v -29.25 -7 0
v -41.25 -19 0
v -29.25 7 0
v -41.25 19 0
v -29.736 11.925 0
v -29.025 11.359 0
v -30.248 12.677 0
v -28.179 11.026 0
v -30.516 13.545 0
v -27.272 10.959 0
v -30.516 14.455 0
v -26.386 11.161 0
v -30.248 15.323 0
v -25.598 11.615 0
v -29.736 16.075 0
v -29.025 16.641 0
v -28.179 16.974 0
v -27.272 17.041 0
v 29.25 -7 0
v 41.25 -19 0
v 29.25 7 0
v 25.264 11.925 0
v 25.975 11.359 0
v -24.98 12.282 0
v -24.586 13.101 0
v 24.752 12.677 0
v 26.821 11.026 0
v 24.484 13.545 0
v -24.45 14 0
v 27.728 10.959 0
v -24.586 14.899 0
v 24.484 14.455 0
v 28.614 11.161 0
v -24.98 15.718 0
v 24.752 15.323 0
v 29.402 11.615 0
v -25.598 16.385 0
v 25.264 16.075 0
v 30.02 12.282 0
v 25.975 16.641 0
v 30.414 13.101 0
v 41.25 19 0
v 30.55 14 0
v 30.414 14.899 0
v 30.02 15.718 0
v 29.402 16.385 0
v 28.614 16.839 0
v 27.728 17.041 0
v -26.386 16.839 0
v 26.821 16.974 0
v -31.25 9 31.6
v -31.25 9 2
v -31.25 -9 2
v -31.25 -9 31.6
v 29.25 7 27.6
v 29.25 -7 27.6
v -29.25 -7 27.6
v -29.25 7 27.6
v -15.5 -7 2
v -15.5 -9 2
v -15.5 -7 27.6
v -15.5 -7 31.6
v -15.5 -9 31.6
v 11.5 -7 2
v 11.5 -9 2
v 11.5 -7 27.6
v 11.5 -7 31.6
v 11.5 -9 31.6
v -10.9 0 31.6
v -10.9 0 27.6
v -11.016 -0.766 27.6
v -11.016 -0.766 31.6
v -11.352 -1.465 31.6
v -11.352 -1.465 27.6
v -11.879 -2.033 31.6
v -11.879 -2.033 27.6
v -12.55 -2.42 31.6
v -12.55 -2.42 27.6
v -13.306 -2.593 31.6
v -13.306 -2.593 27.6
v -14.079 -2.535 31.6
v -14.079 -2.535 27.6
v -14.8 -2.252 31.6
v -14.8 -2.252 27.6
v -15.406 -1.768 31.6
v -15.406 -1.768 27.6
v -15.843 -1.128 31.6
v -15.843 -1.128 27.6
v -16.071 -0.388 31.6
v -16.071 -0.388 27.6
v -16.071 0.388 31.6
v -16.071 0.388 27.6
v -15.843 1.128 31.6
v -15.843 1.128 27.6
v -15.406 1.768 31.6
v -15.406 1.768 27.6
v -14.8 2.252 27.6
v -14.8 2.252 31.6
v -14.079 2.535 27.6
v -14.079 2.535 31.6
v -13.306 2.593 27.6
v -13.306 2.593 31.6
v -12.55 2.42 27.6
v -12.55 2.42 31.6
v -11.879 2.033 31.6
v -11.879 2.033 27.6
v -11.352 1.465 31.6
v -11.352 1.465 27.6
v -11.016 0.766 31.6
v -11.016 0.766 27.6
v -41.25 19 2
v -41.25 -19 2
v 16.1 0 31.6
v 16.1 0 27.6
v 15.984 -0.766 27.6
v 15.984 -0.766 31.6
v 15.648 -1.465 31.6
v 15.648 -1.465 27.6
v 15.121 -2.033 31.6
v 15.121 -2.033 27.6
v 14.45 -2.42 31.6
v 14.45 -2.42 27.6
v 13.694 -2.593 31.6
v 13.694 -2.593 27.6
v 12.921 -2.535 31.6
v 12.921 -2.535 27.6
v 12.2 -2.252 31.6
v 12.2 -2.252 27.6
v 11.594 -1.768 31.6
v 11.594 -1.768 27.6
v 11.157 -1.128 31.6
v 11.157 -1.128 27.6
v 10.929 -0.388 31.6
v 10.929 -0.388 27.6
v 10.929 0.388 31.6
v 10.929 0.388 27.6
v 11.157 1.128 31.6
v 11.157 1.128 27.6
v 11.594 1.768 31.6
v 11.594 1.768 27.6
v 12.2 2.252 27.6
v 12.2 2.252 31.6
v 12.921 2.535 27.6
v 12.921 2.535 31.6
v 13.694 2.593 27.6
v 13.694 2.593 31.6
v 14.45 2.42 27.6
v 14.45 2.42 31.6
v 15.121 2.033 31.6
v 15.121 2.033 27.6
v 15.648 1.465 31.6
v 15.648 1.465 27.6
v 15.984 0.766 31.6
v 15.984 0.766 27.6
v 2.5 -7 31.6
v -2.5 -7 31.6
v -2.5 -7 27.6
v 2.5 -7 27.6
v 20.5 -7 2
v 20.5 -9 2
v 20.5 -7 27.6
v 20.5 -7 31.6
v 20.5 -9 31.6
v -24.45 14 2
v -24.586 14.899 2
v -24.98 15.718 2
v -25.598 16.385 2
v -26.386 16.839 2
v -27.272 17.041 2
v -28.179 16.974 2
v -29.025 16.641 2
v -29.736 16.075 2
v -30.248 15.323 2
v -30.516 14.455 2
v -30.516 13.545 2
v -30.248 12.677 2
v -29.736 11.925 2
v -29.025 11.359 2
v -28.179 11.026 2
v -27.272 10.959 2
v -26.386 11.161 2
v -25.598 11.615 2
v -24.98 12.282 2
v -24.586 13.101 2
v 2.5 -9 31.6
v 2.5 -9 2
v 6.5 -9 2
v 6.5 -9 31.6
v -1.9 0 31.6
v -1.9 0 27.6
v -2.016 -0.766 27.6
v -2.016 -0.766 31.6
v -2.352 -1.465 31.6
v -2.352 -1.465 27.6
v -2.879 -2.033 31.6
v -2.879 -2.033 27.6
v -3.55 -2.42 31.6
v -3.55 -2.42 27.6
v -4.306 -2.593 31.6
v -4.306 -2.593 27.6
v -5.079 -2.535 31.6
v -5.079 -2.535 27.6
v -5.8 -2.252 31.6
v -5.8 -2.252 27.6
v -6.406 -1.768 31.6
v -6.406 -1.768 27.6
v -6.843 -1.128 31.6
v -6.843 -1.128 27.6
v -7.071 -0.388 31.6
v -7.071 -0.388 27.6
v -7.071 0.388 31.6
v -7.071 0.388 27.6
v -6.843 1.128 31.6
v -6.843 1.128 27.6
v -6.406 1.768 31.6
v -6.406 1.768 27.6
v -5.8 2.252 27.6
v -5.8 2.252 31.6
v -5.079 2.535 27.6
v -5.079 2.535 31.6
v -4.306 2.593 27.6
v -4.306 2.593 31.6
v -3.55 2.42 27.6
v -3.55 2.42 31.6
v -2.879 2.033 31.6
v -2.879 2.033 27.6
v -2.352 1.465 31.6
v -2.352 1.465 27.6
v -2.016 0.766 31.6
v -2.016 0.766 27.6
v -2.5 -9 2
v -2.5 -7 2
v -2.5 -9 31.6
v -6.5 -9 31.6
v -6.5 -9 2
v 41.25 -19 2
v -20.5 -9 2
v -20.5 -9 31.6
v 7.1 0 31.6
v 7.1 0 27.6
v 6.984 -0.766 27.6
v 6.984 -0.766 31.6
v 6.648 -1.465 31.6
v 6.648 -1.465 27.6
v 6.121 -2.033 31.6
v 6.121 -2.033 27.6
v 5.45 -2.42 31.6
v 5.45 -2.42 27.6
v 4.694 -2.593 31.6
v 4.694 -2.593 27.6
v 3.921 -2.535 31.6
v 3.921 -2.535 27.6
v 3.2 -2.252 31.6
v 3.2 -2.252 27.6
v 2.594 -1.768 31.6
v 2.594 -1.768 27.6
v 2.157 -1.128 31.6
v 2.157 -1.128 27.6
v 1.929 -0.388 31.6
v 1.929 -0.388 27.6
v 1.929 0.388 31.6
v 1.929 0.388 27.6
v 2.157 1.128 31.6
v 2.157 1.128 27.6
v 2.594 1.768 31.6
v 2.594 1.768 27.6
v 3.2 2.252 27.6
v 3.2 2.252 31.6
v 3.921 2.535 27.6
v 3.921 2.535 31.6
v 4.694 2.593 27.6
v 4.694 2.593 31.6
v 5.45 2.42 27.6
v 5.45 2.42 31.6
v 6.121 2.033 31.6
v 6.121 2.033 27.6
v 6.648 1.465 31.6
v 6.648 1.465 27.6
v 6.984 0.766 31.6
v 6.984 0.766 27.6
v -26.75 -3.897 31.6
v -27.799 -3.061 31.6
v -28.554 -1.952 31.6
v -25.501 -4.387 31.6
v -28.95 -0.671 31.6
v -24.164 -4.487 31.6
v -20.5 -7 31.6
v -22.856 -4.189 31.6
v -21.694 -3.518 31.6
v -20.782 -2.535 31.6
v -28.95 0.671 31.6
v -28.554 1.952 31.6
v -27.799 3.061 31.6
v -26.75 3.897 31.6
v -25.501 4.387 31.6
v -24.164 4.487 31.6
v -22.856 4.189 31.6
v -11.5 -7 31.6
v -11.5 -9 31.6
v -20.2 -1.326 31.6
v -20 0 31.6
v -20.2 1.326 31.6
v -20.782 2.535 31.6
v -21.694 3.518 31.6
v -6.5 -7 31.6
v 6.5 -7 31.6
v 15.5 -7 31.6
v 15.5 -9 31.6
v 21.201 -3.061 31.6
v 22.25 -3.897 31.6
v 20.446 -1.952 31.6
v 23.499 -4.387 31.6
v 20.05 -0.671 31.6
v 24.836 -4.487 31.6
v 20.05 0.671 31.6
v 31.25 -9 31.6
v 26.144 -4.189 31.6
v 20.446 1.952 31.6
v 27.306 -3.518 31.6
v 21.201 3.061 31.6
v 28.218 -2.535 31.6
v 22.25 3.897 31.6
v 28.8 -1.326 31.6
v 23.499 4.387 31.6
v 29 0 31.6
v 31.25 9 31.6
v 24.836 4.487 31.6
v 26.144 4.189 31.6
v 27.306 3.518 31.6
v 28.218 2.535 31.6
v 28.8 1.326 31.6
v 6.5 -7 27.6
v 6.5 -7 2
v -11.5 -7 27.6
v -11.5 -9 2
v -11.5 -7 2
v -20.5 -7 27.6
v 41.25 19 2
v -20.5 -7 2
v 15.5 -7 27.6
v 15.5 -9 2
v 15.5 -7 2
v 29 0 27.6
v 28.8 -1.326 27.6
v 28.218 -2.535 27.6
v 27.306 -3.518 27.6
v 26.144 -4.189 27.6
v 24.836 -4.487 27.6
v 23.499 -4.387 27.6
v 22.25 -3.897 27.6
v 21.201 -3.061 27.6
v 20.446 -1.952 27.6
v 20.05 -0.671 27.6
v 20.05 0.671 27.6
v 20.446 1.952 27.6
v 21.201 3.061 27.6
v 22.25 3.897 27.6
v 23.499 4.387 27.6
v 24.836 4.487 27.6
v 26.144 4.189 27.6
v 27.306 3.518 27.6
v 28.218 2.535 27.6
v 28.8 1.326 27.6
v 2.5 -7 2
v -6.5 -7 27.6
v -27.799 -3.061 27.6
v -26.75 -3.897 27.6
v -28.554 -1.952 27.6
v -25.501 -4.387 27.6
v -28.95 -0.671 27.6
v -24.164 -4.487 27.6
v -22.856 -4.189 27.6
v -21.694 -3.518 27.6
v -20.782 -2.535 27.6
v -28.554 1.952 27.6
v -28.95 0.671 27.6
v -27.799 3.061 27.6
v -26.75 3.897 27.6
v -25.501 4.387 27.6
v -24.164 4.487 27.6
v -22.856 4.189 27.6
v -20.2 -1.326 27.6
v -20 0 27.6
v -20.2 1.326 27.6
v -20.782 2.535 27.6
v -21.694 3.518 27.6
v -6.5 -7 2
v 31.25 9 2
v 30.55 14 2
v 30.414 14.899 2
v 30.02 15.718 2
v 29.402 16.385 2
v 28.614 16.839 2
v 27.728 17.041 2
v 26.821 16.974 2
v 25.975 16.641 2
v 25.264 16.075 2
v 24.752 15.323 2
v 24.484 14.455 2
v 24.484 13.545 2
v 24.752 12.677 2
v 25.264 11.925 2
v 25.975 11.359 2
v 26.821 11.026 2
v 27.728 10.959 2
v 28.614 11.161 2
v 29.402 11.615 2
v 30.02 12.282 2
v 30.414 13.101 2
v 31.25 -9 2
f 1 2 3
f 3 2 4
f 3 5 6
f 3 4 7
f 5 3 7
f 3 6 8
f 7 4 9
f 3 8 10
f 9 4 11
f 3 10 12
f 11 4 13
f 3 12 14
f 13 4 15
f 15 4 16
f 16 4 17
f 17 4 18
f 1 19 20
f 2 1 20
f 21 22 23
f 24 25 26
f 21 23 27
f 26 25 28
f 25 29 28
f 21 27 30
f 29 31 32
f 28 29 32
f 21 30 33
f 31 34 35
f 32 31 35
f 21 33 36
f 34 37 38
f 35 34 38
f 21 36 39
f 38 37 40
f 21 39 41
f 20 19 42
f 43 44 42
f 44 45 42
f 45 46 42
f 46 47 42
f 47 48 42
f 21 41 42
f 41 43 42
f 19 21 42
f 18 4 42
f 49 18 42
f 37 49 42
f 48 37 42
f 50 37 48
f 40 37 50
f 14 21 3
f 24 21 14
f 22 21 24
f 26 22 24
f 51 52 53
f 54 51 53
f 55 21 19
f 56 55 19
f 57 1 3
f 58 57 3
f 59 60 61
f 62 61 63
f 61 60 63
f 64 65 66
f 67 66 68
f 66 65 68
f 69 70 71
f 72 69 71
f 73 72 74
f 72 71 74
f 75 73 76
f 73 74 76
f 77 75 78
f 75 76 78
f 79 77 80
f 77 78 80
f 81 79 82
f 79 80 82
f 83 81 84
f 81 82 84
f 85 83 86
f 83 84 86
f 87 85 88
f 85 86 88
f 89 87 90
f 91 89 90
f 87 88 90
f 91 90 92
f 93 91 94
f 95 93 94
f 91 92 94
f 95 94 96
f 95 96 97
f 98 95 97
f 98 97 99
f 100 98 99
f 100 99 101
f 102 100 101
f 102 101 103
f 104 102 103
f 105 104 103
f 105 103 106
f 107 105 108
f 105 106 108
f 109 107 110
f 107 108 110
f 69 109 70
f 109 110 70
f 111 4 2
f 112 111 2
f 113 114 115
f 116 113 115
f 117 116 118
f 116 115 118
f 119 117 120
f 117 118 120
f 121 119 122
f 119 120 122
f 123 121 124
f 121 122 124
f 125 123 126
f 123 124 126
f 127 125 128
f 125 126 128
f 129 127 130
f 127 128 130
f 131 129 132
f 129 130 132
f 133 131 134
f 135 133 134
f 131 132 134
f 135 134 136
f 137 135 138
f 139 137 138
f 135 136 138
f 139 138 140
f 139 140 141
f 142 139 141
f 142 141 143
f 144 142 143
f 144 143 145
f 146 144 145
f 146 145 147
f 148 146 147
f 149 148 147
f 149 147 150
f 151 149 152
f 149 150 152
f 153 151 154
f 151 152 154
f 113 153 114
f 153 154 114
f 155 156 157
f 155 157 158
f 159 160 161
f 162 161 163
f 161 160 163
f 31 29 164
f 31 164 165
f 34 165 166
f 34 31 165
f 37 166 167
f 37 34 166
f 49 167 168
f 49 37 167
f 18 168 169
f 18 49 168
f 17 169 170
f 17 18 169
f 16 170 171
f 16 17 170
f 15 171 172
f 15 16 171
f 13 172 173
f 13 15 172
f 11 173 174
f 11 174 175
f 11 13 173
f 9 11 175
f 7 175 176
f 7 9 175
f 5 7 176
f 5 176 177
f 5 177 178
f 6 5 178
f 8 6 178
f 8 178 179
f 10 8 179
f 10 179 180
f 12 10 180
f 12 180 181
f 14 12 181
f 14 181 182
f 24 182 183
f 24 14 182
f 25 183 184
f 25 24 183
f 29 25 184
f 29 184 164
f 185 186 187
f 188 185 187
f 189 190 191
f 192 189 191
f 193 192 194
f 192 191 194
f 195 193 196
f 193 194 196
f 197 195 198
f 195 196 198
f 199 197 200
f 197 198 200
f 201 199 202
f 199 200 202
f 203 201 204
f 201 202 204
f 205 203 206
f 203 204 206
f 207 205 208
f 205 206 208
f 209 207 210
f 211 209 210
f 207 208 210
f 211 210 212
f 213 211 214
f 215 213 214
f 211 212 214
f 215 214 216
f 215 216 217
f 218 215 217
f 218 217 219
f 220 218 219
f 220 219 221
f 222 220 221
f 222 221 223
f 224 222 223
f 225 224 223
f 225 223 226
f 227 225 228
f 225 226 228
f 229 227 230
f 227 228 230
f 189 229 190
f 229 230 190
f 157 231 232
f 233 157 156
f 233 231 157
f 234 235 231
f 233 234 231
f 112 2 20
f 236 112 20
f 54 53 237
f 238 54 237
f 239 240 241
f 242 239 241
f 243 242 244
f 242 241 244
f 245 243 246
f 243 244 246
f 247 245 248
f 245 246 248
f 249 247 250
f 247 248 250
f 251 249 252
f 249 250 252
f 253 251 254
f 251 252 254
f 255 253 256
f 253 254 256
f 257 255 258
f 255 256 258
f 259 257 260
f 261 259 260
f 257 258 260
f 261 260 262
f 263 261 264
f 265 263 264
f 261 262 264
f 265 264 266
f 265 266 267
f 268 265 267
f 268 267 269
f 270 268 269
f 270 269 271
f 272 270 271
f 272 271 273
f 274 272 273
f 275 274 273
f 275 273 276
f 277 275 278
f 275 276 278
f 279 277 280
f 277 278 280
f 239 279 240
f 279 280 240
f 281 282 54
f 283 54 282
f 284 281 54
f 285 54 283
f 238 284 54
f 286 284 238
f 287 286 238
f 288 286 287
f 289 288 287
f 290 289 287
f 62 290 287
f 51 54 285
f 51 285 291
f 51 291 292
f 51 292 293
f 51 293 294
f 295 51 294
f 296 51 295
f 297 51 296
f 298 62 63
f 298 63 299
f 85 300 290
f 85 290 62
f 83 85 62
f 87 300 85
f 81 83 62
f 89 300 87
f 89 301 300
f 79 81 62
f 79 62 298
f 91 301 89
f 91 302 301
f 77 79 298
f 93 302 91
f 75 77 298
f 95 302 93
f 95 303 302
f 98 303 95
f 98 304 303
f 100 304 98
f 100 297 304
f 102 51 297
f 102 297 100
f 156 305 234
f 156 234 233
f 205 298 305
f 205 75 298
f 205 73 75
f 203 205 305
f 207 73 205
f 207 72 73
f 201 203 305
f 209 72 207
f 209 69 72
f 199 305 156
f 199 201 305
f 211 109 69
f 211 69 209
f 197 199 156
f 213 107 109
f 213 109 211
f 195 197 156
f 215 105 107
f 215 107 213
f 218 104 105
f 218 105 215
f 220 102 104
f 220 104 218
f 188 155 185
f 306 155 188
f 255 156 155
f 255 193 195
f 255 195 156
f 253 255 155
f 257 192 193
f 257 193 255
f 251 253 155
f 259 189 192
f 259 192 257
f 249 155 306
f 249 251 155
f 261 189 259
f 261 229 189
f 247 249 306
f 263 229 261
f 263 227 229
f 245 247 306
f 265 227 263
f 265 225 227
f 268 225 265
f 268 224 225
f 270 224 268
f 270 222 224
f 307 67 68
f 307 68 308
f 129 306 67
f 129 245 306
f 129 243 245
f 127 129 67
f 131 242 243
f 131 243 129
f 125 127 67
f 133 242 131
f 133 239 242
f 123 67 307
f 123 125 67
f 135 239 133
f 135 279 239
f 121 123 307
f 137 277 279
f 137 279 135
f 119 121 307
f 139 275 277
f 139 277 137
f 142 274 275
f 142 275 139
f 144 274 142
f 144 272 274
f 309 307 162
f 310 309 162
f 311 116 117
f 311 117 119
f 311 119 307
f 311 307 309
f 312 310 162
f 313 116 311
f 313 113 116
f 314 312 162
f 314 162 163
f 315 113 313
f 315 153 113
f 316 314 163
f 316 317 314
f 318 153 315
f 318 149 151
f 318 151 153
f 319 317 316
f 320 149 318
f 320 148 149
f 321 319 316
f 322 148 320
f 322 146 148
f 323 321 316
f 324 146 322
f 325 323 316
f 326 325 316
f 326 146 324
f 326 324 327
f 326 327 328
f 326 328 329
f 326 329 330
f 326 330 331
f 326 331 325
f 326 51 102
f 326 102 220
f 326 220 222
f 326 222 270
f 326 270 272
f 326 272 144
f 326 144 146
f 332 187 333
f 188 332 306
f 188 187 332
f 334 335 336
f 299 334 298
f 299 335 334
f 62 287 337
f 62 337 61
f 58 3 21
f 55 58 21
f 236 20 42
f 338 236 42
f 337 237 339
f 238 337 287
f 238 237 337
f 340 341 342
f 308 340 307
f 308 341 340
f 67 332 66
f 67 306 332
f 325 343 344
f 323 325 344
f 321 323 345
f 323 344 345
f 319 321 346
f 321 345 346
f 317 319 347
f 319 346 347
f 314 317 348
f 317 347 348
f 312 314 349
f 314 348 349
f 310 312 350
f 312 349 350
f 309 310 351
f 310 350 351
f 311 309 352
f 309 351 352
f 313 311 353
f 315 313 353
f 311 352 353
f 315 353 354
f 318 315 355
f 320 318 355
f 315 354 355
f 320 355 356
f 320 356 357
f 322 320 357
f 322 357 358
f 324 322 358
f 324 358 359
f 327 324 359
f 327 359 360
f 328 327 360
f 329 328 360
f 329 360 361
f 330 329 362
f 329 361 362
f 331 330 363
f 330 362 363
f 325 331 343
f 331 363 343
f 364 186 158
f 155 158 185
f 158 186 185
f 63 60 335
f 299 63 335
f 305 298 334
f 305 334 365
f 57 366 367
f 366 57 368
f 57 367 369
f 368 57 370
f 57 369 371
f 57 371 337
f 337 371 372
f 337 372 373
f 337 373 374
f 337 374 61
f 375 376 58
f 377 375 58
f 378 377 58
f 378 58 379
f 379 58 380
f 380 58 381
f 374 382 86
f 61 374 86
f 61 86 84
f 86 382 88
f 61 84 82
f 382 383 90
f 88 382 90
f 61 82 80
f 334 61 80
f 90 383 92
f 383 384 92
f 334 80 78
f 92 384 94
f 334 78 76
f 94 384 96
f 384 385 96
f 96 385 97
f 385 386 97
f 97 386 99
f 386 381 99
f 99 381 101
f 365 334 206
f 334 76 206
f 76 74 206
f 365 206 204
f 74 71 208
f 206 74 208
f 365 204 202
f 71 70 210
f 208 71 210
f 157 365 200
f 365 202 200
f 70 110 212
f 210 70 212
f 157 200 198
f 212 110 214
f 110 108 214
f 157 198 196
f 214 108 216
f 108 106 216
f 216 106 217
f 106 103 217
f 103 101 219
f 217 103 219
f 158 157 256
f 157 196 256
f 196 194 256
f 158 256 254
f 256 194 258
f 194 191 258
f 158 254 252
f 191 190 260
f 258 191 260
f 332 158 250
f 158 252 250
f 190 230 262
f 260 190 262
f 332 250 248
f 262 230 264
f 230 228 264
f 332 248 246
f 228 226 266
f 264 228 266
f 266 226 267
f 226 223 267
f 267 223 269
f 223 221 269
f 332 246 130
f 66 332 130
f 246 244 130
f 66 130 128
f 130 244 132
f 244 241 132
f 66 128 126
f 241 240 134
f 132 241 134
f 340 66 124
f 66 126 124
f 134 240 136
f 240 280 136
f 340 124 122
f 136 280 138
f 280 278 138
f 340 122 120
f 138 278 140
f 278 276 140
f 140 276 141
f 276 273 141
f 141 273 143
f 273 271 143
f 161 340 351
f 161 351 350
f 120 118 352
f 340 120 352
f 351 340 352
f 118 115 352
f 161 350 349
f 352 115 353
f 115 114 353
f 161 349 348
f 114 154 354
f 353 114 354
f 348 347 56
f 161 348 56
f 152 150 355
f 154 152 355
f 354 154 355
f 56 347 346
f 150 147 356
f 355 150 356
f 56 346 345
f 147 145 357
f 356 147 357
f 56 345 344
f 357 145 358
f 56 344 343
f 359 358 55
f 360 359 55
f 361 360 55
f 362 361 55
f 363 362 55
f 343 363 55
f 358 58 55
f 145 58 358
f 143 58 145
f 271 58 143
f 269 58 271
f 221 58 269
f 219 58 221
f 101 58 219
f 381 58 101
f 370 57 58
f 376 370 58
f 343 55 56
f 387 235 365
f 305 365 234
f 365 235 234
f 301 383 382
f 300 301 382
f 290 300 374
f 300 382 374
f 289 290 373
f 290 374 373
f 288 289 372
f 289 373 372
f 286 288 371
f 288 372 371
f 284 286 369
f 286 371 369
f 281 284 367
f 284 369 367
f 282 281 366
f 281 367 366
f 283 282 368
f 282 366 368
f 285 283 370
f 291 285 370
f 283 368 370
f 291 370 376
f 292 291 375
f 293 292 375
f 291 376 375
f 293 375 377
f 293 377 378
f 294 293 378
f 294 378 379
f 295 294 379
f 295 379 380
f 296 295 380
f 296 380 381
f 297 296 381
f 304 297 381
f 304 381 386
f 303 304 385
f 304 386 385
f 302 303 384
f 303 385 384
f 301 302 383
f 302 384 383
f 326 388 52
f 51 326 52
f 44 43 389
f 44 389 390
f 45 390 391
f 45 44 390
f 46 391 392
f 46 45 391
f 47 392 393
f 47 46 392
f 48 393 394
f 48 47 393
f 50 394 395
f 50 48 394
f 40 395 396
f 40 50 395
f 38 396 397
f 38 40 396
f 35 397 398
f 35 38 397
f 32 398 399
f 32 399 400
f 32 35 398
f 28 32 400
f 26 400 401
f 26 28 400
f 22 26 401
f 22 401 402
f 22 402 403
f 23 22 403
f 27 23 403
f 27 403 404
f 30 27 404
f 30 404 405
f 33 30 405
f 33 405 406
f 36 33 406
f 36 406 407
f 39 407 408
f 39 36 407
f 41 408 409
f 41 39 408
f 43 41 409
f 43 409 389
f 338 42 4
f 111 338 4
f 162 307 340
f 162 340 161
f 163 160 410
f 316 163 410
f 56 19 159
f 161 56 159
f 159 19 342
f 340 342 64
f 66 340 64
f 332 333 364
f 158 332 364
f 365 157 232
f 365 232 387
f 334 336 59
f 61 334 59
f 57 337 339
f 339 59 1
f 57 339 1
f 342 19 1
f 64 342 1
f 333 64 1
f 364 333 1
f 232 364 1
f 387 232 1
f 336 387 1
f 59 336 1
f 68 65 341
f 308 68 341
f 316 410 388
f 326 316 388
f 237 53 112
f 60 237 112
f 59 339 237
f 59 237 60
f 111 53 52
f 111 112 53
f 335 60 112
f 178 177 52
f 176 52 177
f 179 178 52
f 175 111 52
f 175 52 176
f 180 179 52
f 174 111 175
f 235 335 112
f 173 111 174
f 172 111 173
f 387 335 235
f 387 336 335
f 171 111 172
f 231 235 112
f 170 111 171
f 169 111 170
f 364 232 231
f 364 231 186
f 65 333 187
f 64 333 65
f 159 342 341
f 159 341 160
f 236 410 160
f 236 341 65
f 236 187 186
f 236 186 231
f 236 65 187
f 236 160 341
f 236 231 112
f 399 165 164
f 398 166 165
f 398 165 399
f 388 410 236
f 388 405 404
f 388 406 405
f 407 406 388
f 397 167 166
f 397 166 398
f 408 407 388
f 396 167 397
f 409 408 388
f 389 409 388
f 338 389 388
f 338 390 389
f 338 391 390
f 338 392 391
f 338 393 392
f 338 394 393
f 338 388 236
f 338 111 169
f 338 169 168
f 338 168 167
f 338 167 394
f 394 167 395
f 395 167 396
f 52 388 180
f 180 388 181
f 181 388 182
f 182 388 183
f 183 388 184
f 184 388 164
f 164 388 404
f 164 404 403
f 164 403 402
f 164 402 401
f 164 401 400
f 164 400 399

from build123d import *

# Parameters (mm, degrees)
F1_DEPTH = 31.6
F2_START = 27.6
F2_DEPTH = 4
F0_R     = 3.05
F3_DEPTH = 2
F4_W     = 2.5
F4_H     = 29.6
F5_DEPTH = 2


with BuildPart() as f1:
    # F0 (on Top) → F1 (new body)
    with BuildSketch(Plane.XY):
        Polygon((31.25, -9), (31.25, 0), (29.25, 0), (29.25, -7), (-29.25, -7), (-29.25, 0), (-31.25, 0), (-31.25, -9), align=None)
        Polygon((31.25, 0), (31.25, 9), (-31.25, 9), (-31.25, 0), (-29.25, 0), (-29.25, 7), (29.25, 7), (29.25, 0), align=None)
    extrude(amount=F1_DEPTH)

    # F0 (on Top) → F2 (join)
    with BuildSketch(Plane.XY.offset(F2_START)):
        with BuildLine():
            Line((29, 0), (29.25, 0))
            Line((29.25, 0), (29.25, 7))
            Line((29.25, 7), (-29.25, 7))
            Line((-29.25, 7), (-29.25, 0))
            Line((-29.25, 0), (-29, 0))
            ThreePointArc((-29, 0), (-24.5, 4.5), (-20, 0))
            Line((-20, 0), (-16.1, 0))
            ThreePointArc((-16.1, 0), (-13.5, 2.6), (-10.9, 0))
            Line((-10.9, 0), (-7.1, 0))
            ThreePointArc((-7.1, 0), (-4.5, 2.6), (-1.9, 0))
            Line((-1.9, 0), (0, 0))
            Line((0, 0), (1.9, 0))
            ThreePointArc((1.9, 0), (4.5, 2.6), (7.1, 0))
            Line((7.1, 0), (10.9, 0))
            ThreePointArc((10.9, 0), (13.5, 2.6), (16.1, 0))
            Line((16.1, 0), (20, 0))
            ThreePointArc((20, 0), (24.5, 4.5), (29, 0))
        make_face()
        with BuildLine():
            Line((29.25, -7), (29.25, 0))
            Line((29.25, 0), (29, 0))
            ThreePointArc((29, 0), (24.5, -4.5), (20, 0))
            Line((20, 0), (16.1, 0))
            ThreePointArc((16.1, 0), (13.5, -2.6), (10.9, 0))
            Line((10.9, 0), (7.1, 0))
            ThreePointArc((7.1, 0), (4.5, -2.6), (1.9, 0))
            Line((1.9, 0), (0, 0))
            Line((0, 0), (-1.9, 0))
            ThreePointArc((-1.9, 0), (-4.5, -2.6), (-7.1, 0))
            Line((-7.1, 0), (-10.9, 0))
            ThreePointArc((-10.9, 0), (-13.5, -2.6), (-16.1, 0))
            Line((-16.1, 0), (-20, 0))
            ThreePointArc((-20, 0), (-24.5, -4.5), (-29, 0))
            Line((-29, 0), (-29.25, 0))
            Line((-29.25, 0), (-29.25, -7))
            Line((-29.25, -7), (29.25, -7))
        make_face()
    extrude(amount=F2_DEPTH)

    # F0 (on Top) → F3 (join)
    with BuildSketch(Plane.XY):
        Polygon((-41.25, 19), (-41.25, 14), (-41.25, -19), (41.25, -19), (41.25, 19), align=None)
        with Locations((-27.5, 14)):
            Circle(F0_R, mode=Mode.SUBTRACT)
        Polygon((-31.25, 9), (31.25, 9), (31.25, 0), (31.25, -9), (-31.25, -9), (-31.25, 0), align=None, mode=Mode.SUBTRACT)
        with Locations((27.5, 14)):
            Circle(F0_R, mode=Mode.SUBTRACT)
    extrude(amount=F3_DEPTH)

    # F4 (on face) → F5 (cut)
    with BuildSketch(Plane.XZ.offset(9)):
        with Locations((-1.25, 16.8)):
            Rectangle(F4_W, F4_H)
        with Locations((1.25, 16.8)):
            Rectangle(F4_W, F4_H)
        with Locations((-19.25, 16.8)):
            Rectangle(F4_W, F4_H)
        with Locations((-16.75, 16.8)):
            Rectangle(F4_W, F4_H)
        with Locations((-10.25, 16.8)):
            Rectangle(F4_W, F4_H)
        with Locations((-7.75, 16.8)):
            Rectangle(F4_W, F4_H)
        with Locations((10.25, 16.8)):
            Rectangle(F4_W, F4_H)
        with Locations((7.75, 16.8)):
            Rectangle(F4_W, F4_H)
        with Locations((16.75, 16.8)):
            Rectangle(F4_W, F4_H)
        with Locations((19.25, 16.8)):
            Rectangle(F4_W, F4_H)
    extrude(amount=-F5_DEPTH, mode=Mode.SUBTRACT)


solid = f1.part
